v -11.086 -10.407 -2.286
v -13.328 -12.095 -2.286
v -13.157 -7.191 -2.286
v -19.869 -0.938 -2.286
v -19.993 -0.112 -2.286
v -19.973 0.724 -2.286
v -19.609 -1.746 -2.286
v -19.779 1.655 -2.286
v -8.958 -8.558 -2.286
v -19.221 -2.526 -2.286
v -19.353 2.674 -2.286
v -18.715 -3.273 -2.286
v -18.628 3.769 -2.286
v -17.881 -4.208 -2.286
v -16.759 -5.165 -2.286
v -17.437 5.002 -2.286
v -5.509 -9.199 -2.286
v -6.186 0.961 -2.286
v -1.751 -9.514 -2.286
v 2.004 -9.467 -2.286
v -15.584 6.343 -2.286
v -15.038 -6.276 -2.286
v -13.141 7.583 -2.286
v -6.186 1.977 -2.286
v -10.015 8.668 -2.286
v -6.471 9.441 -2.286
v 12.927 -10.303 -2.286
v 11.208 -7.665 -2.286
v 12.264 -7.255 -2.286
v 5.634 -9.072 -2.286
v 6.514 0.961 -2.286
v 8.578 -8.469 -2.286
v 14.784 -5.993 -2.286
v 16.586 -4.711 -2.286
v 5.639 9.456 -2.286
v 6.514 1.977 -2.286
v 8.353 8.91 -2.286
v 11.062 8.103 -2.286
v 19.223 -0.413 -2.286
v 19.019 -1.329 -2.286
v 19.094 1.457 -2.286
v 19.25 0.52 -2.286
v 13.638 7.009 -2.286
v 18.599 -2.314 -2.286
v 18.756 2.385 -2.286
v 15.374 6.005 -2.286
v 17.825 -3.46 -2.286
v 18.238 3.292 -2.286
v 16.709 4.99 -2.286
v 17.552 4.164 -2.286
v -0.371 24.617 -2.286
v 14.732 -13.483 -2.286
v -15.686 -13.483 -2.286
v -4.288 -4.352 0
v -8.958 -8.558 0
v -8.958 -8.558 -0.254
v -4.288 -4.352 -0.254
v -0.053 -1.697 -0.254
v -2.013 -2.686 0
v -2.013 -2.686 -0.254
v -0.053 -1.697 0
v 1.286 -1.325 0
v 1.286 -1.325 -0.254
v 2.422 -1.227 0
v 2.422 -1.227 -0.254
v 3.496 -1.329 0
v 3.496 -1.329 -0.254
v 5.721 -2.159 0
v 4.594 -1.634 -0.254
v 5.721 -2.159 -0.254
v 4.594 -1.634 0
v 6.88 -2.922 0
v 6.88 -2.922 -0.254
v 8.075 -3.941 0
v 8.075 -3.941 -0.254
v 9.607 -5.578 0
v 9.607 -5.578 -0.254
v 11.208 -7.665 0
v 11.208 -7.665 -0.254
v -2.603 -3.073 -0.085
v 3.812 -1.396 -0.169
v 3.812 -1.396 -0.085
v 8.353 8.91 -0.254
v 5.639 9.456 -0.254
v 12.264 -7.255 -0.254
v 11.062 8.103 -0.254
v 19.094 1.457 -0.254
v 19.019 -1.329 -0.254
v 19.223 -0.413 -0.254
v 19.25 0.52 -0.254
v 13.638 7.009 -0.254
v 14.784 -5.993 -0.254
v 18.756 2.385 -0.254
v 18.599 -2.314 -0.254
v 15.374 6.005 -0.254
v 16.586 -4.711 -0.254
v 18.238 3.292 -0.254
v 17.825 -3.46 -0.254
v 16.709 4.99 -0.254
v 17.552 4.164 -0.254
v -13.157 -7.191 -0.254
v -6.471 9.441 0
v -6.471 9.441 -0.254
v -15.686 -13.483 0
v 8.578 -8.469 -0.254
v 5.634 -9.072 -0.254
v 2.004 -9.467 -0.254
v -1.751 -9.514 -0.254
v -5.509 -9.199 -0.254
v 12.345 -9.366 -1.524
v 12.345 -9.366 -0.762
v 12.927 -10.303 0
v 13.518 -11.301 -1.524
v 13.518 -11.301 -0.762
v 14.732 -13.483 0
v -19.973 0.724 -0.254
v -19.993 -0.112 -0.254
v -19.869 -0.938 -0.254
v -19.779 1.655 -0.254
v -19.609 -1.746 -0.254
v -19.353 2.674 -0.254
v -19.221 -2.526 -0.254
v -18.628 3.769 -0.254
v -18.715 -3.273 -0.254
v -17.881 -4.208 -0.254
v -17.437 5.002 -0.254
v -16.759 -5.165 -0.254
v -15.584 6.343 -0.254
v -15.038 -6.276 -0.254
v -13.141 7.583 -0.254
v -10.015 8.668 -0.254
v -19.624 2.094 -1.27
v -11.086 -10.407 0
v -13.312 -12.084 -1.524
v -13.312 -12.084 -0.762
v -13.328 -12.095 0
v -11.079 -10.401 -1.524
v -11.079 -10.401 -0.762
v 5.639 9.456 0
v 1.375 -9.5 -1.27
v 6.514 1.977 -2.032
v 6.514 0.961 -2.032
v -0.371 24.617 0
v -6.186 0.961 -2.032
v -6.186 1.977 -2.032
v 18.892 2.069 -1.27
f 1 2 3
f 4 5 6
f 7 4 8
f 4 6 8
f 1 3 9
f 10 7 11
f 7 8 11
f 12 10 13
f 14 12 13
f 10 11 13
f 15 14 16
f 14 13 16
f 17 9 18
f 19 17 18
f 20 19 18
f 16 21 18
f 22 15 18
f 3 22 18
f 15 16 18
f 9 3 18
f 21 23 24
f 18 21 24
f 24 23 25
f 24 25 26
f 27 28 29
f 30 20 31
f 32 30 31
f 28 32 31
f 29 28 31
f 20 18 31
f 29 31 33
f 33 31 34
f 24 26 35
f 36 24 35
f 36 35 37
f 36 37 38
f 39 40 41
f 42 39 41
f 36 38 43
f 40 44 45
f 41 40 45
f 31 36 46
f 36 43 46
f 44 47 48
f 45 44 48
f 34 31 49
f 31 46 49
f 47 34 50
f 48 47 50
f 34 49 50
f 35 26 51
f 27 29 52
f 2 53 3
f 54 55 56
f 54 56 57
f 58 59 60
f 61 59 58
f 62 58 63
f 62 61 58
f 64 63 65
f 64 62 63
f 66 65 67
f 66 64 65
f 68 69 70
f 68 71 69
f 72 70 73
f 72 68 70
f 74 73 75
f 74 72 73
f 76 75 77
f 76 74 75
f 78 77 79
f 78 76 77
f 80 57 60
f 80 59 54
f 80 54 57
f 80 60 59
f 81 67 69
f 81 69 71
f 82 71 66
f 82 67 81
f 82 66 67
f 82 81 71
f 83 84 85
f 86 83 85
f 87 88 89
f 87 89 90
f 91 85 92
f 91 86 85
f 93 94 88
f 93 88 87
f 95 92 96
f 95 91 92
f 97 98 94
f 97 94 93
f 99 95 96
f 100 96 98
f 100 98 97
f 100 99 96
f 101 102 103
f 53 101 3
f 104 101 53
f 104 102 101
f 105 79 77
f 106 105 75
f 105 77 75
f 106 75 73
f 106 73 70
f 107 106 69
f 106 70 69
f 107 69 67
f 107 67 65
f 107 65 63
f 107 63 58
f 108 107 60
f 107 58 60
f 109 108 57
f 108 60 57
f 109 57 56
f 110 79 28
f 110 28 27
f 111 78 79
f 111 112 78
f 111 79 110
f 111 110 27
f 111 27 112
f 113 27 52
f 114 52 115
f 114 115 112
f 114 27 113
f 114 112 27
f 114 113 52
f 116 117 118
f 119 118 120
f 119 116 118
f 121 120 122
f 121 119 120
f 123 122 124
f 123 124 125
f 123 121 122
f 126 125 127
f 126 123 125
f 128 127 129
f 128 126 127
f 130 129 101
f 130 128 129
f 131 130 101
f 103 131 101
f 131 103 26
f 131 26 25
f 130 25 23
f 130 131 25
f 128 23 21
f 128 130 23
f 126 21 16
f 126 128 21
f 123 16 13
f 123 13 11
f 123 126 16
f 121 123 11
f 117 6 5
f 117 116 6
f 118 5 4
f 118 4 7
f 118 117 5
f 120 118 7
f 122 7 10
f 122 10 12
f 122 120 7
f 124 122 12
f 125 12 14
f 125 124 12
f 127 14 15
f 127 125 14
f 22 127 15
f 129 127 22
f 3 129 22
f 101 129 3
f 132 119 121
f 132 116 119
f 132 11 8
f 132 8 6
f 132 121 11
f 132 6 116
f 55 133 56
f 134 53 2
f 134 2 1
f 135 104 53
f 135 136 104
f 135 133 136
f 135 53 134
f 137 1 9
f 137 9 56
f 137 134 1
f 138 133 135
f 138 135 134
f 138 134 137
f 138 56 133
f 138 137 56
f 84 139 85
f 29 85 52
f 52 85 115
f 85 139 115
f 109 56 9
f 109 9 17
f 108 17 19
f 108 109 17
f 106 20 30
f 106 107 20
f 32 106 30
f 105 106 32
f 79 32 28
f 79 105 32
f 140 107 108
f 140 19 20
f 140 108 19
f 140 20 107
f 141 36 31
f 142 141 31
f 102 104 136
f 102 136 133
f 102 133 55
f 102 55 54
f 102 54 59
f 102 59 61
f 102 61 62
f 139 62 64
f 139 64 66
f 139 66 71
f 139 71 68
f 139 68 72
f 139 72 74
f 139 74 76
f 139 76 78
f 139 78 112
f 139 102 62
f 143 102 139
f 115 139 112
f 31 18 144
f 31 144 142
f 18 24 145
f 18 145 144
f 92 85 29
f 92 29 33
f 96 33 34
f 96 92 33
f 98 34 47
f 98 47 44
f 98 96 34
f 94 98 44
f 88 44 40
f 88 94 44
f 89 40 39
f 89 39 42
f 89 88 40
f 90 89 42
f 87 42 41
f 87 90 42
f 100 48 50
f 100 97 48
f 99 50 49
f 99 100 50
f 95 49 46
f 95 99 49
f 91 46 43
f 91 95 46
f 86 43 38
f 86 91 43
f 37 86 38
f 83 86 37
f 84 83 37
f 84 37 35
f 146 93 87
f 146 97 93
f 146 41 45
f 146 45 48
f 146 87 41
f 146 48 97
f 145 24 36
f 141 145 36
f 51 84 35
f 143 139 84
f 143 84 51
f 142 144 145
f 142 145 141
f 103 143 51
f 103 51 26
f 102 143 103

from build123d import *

# Parameters (mm, degrees)
F1_DEPTH = 2.286
F2_DEPTH = 0.254
F3_W     = 12.7
F3_H     = 1.016
F4_DEPTH = 0.254


with BuildPart() as f1:
    # F0 (on Top) → F1 (new body)
    with BuildSketch(Plane.XY):
        with BuildLine():
            Line((-13.1568801942, -7.1914618043), (-15.685681705, -13.4825458221))
            add(Edge.make_bspline(
                [(-15.685681705, -13.4825458221), (-13.2321975411, -12.2693498698), (-11.0318471059, -10.4379374373), (-8.9577929719, -8.5581073527)],
                knots=[0, 0, 0, 0, 6.5648699385, 6.5648699385, 6.5648699385, 6.5648699385], degree=3))
            add(Edge.make_bspline(
                [(-8.9577929719, -8.5581073527), (-2.326521087, -2.5478185256), (3.0136976356, 3.9574156183), (11.2083703228, -7.6654970922)],
                knots=[6.5648699385, 6.5648699385, 6.5648699385, 6.5648699385, 27.554407645, 27.554407645, 27.554407645, 27.554407645], degree=3))
            add(Edge.make_bspline(
                [(11.2083703228, -7.6654970922), (12.3264260334, -9.2512912326), (13.497617481, -11.1745413121), (14.7324733271, -13.4825458221)],
                knots=[27.554407645, 27.554407645, 27.554407645, 27.554407645, 30.4181550321, 30.4181550321, 30.4181550321, 30.4181550321], degree=3))
            Line((14.7324733271, -13.4825458221), (12.2638968299, -7.2552273315))
            Line((12.2638968299, -7.2552273315), (5.6394149783, 9.4559251776))
            Line((5.6394149783, 9.4559251776), (-0.3707793305, 24.6174541779))
            Line((-0.3707793305, 24.6174541779), (-6.4710147318, 9.441453502))
            Line((-6.4710147318, 9.441453502), (-13.1568801942, -7.1914618043))
        make_face()
        with BuildLine():
            add(Edge.make_bspline(
                [(-6.4710147318, 9.441453502), (-39.6247541981, 4.06906696), (-13.1568801942, -7.1914618043)],
                knots=[1.8867642182, 1.8867642182, 1.8867642182, 4.0030869743, 4.0030869743, 4.0030869743], degree=2, weights=[1, 0.4904751866, 1]))
            Line((-13.1568801942, -7.1914618043), (-6.4710147318, 9.441453502))
        make_face()
        with BuildLine():
            add(Edge.make_bspline(
                [(-8.9577929719, -8.5581073527), (-2.326521087, -2.5478185256), (3.0136976356, 3.9574156183), (11.2083703228, -7.6654970922)],
                knots=[6.5648699385, 6.5648699385, 6.5648699385, 6.5648699385, 27.554407645, 27.554407645, 27.554407645, 27.554407645], degree=3))
            add(Edge.make_bspline(
                [(-8.9577929719, -8.5581073527), (1.6671986102, -11.1197744869), (11.2083703228, -7.6654970922)],
                knots=[4.2596733084, 4.2596733084, 4.2596733084, 5.3432299115, 5.3432299115, 5.3432299115], degree=2, weights=[1, 0.8567930368, 1]))
        make_face()
        with BuildLine():
            add(Edge.make_bspline(
                [(12.2638968299, -7.2552273315), (39.4332818564, 4.06906696), (5.6394149783, 9.4559251776)],
                knots=[5.4115698154, 5.4115698154, 5.4115698154, 7.5428353935, 7.5428353935, 7.5428353935], degree=2, weights=[1, 0.4839505579, 1]))
            Line((5.6394149783, 9.4559251776), (12.2638968299, -7.2552273315))
        make_face()
    extrude(amount=-F1_DEPTH)

    # F0 (on Top) → F2 (cut)
    with BuildSketch(Plane.XY):
        with BuildLine():
            add(Edge.make_bspline(
                [(-6.4710147318, 9.441453502), (-39.6247541981, 4.06906696), (-13.1568801942, -7.1914618043)],
                knots=[1.8867642182, 1.8867642182, 1.8867642182, 4.0030869743, 4.0030869743, 4.0030869743], degree=2, weights=[1, 0.4904751866, 1]))
            Line((-13.1568801942, -7.1914618043), (-6.4710147318, 9.441453502))
        make_face()
        with BuildLine():
            add(Edge.make_bspline(
                [(12.2638968299, -7.2552273315), (39.4332818564, 4.06906696), (5.6394149783, 9.4559251776)],
                knots=[5.4115698154, 5.4115698154, 5.4115698154, 7.5428353935, 7.5428353935, 7.5428353935], degree=2, weights=[1, 0.4839505579, 1]))
            Line((5.6394149783, 9.4559251776), (12.2638968299, -7.2552273315))
        make_face()
        with BuildLine():
            add(Edge.make_bspline(
                [(-8.9577929719, -8.5581073527), (-2.326521087, -2.5478185256), (3.0136976356, 3.9574156183), (11.2083703228, -7.6654970922)],
                knots=[6.5648699385, 6.5648699385, 6.5648699385, 6.5648699385, 27.554407645, 27.554407645, 27.554407645, 27.554407645], degree=3))
            add(Edge.make_bspline(
                [(-8.9577929719, -8.5581073527), (1.6671986102, -11.1197744869), (11.2083703228, -7.6654970922)],
                knots=[4.2596733084, 4.2596733084, 4.2596733084, 5.3432299115, 5.3432299115, 5.3432299115], degree=2, weights=[1, 0.8567930368, 1]))
        make_face()
    extrude(amount=-F2_DEPTH, mode=Mode.SUBTRACT)

    # F3 (on face) → F4 (cut)
    with BuildSketch(Plane(origin=(0, 0, -2.286), x_dir=(1, 0, 0), z_dir=(0, 0, -1))):
        with Locations((0.1644820441, -1.469257871)):
            Rectangle(F3_W, F3_H)
    extrude(amount=-F4_DEPTH, mode=Mode.SUBTRACT)


solid = f1.part
